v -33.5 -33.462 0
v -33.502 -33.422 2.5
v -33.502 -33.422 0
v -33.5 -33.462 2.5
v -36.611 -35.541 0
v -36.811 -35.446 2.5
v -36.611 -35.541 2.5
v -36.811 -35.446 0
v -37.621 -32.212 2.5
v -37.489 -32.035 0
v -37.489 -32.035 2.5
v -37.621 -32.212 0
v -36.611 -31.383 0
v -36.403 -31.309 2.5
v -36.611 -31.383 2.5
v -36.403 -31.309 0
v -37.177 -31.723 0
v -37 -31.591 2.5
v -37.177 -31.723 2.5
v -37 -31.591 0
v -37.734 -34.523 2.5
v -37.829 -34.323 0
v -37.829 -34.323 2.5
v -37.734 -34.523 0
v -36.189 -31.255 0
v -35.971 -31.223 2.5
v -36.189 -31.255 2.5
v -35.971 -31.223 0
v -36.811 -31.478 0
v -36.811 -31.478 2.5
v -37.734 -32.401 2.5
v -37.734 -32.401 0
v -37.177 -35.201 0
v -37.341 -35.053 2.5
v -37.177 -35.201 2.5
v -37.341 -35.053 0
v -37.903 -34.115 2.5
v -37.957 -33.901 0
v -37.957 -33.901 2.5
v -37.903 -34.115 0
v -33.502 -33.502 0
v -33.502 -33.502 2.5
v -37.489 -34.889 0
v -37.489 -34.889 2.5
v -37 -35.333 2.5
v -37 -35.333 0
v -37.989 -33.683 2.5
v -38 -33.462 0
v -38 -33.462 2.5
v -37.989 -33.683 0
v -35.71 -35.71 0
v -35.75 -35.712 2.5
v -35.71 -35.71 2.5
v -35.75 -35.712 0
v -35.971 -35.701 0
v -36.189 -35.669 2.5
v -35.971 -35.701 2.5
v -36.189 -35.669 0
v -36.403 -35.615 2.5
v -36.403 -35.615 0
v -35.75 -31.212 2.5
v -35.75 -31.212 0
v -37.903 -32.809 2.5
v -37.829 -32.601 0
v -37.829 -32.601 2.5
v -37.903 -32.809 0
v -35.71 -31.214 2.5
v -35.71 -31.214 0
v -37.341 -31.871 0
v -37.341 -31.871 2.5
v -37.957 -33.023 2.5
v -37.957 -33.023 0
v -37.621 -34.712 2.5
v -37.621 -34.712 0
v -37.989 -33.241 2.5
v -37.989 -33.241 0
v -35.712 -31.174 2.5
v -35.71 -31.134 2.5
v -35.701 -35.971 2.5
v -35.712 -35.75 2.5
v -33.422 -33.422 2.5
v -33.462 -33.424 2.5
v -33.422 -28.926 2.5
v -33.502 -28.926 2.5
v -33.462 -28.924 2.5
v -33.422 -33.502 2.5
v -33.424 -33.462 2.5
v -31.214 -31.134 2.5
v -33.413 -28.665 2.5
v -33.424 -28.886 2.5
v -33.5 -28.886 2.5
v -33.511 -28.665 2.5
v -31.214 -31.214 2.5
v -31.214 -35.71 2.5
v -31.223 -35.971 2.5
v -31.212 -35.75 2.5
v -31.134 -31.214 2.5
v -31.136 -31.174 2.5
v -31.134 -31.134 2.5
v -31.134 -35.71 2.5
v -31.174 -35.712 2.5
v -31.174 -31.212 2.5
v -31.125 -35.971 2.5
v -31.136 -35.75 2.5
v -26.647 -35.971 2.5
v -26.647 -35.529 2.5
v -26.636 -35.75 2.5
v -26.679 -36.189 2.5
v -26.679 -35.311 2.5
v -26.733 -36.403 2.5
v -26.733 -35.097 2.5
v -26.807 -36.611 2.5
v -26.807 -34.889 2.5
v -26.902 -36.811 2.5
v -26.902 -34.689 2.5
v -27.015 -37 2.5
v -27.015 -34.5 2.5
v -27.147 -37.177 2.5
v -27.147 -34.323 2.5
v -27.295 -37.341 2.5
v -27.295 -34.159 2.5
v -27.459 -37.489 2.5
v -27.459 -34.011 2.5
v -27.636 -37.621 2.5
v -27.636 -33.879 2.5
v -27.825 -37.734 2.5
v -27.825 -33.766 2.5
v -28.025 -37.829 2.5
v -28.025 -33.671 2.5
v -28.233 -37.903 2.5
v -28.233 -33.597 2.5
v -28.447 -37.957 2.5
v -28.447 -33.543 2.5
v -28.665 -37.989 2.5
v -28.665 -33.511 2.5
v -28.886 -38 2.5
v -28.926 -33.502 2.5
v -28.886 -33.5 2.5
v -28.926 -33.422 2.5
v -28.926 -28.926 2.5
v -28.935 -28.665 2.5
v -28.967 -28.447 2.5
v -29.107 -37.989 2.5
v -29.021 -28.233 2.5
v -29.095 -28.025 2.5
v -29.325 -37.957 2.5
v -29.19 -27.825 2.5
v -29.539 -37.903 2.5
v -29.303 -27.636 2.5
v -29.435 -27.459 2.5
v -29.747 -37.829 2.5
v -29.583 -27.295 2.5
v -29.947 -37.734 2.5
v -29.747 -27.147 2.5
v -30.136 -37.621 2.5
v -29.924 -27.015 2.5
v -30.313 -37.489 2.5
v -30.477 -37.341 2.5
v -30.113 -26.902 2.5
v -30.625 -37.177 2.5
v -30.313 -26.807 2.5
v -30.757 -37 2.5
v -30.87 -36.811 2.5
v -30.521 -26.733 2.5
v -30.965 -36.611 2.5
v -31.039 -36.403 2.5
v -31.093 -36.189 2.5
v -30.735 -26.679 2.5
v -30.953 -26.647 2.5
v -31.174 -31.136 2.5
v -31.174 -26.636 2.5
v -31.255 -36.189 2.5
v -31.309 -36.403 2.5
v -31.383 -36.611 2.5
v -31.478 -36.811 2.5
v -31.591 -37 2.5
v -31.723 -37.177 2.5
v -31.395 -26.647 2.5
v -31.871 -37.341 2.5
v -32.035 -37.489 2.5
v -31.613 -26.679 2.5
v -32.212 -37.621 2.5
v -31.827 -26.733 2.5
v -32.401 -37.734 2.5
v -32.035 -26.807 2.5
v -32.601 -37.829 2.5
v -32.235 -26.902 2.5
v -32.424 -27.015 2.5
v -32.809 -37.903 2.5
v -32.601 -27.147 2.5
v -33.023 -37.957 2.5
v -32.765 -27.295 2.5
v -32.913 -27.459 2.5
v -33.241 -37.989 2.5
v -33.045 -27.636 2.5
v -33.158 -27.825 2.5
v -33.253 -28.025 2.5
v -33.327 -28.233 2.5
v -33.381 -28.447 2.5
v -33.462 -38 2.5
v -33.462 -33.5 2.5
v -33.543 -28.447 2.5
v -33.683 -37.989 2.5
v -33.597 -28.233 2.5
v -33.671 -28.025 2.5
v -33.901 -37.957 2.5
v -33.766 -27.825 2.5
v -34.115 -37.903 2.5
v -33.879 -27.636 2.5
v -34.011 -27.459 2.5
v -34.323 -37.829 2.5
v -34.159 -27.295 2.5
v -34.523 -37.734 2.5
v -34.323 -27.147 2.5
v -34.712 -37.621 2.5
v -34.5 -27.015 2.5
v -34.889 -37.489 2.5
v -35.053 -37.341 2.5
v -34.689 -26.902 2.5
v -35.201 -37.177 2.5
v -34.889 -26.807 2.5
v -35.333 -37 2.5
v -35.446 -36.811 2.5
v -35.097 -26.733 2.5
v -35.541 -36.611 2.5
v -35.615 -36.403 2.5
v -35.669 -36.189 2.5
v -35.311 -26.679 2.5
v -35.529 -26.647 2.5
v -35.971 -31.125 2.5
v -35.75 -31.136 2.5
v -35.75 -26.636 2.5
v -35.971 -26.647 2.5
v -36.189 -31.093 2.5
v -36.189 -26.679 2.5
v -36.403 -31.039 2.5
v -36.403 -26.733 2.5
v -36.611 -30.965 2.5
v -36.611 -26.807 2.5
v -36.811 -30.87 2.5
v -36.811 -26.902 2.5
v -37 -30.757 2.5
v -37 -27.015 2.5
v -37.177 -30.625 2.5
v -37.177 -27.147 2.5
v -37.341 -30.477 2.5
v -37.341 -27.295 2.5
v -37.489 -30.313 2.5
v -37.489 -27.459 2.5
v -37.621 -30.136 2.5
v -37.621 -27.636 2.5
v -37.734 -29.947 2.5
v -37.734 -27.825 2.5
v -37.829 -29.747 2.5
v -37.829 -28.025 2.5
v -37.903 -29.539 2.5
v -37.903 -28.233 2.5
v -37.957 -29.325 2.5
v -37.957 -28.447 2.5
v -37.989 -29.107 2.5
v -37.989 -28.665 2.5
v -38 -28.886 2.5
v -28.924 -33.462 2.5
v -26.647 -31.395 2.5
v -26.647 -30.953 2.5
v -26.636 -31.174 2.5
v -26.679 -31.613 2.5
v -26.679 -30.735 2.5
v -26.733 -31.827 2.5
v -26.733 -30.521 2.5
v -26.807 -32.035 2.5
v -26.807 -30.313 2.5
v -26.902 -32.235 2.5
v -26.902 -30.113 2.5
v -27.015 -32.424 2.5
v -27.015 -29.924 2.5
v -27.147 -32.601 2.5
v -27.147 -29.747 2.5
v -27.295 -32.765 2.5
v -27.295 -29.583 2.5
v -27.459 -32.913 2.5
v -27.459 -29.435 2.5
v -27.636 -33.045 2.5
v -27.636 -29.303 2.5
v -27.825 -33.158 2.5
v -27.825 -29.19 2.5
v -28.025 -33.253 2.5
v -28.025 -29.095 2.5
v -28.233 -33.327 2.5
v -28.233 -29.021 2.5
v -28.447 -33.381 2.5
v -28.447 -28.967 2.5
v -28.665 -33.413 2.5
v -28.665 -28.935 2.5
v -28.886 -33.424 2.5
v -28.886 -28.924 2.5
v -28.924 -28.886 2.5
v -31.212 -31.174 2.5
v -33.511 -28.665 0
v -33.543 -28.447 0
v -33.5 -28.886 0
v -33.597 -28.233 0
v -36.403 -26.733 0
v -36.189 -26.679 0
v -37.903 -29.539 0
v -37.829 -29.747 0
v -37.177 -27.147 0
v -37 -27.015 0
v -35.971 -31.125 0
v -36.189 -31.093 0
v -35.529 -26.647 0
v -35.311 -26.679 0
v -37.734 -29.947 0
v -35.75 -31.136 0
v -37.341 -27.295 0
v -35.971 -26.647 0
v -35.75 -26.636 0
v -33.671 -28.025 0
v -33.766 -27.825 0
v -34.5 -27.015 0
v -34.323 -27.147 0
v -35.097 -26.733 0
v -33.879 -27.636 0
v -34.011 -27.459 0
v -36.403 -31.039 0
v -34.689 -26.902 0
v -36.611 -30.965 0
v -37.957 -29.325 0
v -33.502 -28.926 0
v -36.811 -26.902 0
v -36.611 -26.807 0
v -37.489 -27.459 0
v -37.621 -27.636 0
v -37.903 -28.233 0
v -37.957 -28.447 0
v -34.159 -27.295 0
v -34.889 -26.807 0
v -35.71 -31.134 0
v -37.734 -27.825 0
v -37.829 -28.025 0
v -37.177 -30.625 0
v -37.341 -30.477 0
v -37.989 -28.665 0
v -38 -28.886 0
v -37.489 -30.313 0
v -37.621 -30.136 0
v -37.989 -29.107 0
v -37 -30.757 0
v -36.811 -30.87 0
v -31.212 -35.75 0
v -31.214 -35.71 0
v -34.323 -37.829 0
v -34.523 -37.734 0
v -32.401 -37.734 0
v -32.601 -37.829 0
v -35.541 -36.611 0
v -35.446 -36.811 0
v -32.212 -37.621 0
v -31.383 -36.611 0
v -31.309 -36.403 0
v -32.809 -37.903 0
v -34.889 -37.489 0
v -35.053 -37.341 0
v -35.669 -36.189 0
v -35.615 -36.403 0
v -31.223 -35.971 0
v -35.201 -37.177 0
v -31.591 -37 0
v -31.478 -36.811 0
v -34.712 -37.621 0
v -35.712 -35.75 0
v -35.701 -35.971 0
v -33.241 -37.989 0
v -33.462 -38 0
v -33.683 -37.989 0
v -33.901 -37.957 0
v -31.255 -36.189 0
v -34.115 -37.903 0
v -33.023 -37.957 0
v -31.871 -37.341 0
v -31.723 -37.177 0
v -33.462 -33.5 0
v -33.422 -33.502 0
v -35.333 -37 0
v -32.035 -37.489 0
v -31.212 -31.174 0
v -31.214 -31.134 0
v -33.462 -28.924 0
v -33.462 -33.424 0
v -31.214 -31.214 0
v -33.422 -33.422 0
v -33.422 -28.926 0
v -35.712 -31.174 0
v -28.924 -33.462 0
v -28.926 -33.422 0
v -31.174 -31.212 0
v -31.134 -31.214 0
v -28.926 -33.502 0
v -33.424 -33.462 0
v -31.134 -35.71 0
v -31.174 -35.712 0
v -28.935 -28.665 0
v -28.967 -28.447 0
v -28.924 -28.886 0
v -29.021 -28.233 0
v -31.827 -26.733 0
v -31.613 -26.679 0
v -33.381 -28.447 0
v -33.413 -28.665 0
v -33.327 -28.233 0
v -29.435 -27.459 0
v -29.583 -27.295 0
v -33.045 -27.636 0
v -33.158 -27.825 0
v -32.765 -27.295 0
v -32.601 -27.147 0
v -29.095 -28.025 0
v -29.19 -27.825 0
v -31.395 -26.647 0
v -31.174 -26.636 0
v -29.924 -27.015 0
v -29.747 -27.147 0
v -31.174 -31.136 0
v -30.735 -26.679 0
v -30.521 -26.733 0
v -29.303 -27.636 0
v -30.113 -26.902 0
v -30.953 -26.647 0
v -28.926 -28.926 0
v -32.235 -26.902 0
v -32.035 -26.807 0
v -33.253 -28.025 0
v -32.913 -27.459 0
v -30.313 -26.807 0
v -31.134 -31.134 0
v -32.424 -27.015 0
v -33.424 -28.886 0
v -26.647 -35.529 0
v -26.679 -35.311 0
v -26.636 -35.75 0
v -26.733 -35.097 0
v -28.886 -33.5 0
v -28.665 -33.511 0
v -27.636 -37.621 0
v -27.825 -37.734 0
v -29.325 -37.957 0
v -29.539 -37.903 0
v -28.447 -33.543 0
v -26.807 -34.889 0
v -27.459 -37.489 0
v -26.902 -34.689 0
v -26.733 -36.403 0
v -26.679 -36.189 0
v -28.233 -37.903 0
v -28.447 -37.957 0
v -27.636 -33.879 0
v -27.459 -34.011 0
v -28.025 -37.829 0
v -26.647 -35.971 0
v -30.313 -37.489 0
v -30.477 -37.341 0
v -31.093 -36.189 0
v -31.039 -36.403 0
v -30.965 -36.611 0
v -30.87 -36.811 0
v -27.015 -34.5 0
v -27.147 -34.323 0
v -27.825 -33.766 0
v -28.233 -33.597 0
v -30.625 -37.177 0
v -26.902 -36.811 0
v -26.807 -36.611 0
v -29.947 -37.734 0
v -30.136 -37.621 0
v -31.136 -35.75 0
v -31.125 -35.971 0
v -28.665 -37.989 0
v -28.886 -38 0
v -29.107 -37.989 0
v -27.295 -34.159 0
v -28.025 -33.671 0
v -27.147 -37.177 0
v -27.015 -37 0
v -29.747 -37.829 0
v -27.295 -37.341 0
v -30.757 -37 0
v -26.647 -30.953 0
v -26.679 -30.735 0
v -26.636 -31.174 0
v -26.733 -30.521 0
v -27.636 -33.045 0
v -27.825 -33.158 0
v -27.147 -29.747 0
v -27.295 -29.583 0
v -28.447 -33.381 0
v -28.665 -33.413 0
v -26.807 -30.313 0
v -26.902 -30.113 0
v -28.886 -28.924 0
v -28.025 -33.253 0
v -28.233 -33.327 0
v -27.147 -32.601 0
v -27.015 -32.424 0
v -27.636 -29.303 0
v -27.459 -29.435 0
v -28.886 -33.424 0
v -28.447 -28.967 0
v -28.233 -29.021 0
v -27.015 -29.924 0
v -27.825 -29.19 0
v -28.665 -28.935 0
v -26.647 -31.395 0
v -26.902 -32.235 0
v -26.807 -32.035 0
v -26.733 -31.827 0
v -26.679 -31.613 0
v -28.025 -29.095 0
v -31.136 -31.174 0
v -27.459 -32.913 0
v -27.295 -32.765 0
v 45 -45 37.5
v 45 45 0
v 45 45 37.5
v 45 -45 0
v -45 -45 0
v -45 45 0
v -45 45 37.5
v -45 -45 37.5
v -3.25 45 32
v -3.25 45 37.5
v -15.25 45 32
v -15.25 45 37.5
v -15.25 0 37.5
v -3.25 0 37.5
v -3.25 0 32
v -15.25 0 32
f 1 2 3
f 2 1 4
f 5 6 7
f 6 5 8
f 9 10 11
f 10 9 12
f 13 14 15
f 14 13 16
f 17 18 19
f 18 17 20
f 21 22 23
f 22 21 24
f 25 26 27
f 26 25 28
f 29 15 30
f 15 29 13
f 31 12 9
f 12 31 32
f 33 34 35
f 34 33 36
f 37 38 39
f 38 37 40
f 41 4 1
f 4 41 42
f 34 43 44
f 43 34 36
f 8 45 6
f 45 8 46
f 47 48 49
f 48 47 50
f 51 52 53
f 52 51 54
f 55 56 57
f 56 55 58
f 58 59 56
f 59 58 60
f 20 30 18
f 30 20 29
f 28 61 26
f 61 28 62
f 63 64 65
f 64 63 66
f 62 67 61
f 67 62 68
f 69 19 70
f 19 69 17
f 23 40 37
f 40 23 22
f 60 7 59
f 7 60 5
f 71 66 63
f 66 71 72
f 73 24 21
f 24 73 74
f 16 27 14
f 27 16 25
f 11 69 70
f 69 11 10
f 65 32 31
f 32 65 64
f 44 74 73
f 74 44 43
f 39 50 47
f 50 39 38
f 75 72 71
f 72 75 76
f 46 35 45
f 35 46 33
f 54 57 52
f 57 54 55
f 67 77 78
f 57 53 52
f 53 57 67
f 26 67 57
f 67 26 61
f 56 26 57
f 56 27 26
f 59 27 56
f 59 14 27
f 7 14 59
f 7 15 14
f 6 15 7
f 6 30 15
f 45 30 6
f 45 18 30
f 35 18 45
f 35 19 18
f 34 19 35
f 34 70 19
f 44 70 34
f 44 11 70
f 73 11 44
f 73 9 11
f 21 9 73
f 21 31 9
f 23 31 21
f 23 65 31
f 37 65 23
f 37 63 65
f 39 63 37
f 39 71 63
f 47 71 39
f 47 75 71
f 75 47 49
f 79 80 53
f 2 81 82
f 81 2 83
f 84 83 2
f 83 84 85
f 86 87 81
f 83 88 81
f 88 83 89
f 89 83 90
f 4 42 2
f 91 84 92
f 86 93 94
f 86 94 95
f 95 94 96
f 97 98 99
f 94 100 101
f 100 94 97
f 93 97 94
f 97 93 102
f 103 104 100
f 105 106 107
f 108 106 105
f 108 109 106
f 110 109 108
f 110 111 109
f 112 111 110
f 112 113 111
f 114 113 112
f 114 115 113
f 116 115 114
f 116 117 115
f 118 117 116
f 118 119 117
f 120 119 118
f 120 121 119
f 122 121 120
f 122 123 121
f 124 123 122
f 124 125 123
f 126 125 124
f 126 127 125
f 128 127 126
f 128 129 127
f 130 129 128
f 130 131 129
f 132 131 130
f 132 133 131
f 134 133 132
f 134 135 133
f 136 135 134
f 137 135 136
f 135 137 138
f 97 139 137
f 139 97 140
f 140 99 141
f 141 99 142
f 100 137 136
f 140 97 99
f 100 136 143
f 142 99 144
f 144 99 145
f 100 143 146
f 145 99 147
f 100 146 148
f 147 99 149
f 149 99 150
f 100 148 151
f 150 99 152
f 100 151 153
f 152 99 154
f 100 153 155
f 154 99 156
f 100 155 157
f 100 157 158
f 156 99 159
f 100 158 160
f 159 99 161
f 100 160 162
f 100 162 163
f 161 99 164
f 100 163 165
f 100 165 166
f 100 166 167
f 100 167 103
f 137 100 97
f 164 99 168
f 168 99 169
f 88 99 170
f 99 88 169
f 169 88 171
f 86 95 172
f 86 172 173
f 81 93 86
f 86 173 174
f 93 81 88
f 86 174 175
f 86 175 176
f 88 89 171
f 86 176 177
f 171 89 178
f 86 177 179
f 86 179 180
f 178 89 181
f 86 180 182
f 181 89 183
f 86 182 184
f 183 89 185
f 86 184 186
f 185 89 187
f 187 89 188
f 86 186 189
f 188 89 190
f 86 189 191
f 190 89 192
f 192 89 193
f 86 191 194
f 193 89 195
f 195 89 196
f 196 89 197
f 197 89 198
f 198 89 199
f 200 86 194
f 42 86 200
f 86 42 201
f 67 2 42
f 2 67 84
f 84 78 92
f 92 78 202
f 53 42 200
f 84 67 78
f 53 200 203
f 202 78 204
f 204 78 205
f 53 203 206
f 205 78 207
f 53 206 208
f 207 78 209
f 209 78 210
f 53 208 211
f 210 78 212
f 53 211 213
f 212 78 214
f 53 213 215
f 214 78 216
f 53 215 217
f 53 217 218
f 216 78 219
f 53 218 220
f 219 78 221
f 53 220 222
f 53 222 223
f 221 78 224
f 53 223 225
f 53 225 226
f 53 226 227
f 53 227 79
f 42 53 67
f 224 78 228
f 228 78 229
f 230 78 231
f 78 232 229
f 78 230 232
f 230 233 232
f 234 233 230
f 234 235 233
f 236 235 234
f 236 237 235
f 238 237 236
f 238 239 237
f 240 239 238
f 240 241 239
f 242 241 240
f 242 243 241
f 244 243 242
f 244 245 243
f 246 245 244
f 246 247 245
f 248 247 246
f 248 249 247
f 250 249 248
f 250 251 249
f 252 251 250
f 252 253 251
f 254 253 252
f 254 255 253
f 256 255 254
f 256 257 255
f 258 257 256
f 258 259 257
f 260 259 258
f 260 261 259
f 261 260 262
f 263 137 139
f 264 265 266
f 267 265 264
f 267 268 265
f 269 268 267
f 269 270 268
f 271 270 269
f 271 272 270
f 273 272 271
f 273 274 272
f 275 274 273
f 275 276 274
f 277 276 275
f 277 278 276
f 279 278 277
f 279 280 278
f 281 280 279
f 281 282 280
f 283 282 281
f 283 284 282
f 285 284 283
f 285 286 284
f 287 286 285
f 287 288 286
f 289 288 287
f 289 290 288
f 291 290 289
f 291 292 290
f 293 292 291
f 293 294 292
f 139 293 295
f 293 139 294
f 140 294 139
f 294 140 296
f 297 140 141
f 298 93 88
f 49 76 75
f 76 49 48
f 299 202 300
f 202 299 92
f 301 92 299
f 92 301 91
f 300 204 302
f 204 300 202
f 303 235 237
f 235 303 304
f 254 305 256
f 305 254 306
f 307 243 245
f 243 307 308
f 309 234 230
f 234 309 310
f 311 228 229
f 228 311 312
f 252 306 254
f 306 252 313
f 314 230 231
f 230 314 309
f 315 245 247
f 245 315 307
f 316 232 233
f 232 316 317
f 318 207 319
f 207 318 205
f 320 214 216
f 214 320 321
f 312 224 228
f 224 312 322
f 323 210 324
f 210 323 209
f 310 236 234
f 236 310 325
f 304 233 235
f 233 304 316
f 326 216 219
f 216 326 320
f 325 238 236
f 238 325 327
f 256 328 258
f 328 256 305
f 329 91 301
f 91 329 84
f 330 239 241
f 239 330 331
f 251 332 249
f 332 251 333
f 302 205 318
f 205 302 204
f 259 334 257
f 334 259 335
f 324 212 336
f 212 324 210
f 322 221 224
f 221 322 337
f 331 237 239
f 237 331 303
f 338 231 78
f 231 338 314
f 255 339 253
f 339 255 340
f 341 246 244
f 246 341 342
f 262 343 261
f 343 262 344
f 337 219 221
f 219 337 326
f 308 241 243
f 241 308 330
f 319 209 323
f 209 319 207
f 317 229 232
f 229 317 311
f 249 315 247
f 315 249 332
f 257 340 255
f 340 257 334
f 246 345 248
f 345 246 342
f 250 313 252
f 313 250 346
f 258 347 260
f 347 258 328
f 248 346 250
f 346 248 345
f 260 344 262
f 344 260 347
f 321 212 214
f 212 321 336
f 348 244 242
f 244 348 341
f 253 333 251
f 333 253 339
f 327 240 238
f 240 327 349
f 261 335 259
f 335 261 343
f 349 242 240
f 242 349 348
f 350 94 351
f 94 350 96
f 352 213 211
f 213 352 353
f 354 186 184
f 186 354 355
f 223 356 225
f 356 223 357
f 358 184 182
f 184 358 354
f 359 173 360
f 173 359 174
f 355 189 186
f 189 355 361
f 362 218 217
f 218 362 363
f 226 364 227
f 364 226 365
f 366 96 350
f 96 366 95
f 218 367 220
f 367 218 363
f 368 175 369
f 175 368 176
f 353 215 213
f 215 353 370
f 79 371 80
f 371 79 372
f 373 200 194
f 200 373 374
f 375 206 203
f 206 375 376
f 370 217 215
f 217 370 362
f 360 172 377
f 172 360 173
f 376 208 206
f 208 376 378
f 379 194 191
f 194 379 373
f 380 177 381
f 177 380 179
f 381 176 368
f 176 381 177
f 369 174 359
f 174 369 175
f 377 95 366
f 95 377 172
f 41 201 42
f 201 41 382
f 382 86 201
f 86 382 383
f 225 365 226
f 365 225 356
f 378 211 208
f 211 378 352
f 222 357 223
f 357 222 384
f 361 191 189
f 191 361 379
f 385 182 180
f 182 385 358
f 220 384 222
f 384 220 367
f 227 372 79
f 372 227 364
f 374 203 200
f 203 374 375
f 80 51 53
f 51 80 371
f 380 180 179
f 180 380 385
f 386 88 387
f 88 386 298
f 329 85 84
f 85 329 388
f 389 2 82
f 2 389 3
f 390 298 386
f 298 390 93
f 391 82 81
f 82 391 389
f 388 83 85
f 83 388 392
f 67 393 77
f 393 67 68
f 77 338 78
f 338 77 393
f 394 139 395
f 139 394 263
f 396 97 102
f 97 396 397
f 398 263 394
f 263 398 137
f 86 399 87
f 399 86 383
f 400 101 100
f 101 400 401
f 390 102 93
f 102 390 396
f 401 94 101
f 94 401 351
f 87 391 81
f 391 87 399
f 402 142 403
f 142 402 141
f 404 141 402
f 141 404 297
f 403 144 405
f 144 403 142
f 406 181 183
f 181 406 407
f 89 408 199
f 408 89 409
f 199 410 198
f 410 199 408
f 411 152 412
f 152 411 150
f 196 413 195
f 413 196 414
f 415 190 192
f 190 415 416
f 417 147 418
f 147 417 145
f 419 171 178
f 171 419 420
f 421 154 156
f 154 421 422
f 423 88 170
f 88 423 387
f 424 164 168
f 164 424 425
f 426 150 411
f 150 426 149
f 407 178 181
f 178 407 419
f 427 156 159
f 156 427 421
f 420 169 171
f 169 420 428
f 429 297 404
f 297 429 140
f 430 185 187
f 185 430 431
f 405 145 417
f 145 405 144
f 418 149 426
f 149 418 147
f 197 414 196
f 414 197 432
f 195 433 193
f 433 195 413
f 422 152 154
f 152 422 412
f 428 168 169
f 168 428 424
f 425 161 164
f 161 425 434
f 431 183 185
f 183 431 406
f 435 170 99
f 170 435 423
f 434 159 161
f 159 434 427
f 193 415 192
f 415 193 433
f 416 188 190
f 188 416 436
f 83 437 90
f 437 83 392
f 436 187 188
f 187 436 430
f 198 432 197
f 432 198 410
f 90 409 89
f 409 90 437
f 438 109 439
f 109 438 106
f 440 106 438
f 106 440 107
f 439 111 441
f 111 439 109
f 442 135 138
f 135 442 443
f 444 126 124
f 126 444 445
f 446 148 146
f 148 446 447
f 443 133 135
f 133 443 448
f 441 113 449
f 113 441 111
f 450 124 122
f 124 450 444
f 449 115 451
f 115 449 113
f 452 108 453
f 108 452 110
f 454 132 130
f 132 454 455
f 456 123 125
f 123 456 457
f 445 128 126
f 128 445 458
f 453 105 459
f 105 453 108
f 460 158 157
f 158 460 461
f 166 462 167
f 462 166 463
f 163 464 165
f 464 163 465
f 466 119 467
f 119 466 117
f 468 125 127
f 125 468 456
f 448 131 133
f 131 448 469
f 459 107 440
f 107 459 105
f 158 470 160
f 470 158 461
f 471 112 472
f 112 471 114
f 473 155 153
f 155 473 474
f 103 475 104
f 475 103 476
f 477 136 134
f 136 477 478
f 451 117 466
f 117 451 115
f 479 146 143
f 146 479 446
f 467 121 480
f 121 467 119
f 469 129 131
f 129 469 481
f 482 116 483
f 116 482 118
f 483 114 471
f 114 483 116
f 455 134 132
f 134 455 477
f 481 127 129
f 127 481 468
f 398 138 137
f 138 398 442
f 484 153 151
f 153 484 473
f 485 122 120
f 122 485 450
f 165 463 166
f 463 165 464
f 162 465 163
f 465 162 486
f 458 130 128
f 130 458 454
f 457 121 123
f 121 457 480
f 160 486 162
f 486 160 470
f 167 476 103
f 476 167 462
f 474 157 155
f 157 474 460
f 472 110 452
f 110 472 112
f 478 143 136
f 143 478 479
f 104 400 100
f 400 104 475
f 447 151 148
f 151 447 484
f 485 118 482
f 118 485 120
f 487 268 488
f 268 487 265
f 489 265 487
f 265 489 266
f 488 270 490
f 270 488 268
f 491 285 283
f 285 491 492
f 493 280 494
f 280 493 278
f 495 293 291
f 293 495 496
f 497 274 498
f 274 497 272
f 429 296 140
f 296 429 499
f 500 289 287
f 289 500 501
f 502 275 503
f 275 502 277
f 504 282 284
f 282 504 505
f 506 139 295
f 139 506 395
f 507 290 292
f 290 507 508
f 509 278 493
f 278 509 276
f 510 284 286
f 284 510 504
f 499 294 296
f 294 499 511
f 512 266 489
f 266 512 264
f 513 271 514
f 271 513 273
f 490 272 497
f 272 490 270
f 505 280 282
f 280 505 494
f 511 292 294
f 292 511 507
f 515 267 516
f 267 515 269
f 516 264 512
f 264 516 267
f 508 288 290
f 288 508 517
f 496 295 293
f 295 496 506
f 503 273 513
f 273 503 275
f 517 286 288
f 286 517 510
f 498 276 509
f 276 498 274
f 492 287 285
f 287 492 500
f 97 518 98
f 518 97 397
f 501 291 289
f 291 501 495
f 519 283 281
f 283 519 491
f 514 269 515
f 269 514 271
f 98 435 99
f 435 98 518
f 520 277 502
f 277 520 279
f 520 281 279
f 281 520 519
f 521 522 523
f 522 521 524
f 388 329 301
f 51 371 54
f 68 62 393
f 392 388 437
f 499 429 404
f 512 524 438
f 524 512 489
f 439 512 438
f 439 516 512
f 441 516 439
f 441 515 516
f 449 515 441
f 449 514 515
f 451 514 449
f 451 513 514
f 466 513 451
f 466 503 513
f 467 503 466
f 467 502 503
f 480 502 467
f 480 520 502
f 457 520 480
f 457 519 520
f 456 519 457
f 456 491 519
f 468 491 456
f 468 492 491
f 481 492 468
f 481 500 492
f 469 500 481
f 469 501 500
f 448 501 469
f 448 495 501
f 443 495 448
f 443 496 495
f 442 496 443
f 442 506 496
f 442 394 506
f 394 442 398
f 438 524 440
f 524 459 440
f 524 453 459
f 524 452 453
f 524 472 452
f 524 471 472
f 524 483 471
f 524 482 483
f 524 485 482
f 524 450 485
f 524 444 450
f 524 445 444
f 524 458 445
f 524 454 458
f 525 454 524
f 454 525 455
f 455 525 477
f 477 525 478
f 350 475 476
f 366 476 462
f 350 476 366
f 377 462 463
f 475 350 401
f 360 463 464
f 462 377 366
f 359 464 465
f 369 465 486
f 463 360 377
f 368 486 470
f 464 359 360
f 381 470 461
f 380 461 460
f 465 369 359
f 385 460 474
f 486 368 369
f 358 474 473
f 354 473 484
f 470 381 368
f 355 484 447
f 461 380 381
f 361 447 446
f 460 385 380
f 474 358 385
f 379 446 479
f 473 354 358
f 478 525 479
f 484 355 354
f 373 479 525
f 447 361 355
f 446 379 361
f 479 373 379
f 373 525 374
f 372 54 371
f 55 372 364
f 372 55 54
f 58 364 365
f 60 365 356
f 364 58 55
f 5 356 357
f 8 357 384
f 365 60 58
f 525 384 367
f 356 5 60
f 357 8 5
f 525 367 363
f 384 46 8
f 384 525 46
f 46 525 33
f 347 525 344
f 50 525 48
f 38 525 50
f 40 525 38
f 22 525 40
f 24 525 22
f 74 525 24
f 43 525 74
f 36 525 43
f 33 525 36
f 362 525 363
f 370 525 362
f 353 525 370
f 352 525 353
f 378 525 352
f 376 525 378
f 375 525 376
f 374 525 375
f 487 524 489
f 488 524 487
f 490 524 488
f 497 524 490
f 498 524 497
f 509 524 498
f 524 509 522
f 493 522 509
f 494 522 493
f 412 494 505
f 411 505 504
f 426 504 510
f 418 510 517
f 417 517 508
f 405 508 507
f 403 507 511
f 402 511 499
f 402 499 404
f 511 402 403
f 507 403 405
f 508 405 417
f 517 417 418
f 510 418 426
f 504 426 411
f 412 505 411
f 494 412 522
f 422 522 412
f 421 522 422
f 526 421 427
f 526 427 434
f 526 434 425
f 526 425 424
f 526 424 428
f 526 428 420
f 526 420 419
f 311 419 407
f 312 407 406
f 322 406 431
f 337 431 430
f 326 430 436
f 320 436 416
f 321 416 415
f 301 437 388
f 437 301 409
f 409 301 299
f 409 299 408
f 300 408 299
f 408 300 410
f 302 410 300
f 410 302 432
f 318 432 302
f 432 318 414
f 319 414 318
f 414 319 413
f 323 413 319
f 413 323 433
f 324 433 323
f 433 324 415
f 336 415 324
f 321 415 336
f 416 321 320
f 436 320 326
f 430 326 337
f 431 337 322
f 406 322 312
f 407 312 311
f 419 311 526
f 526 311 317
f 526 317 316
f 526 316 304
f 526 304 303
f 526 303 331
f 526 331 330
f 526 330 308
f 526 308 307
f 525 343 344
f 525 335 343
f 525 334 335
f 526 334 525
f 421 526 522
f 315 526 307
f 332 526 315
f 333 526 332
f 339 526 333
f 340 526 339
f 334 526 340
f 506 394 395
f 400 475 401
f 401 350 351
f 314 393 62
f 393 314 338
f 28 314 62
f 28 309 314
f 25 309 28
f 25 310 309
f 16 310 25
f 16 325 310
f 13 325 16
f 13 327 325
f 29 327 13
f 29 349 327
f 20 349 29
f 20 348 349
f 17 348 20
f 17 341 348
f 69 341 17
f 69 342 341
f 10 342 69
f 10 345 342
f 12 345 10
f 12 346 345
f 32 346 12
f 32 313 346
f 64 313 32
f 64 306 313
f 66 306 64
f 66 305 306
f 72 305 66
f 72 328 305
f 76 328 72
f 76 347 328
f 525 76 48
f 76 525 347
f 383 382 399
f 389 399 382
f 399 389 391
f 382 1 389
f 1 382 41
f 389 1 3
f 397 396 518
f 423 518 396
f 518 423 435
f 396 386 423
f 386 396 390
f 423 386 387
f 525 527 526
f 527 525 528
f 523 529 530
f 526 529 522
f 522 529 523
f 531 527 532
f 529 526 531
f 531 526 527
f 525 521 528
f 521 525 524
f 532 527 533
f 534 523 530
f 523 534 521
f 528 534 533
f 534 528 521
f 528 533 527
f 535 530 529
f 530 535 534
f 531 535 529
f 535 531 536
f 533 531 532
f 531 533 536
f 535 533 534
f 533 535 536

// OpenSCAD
// Magnetic stirrer housing - upside-down open box over PC fan
// Print orientation: top plate on bed (z = 0), walls rise to z = 40

// ---- Dimensions (mm) ----
plate_t      = 2;     // top plate thickness
wall_t       = 2.5;   // wall thickness
box_h        = 40;    // total height of box (open top)
outer_x      = 90;    // outer size in X
outer_y      = 90;    // outer size in Y
hole_d       = 4.5;   // M4 screw hole diameter
hole_p       = 71.5;  // square pitch of hole centres
notch_w      = 12;    // cable notch width
notch_d      = 8;     // cable notch depth from open edge

eps          = 0.5;   // cutter overshoot past faces

$fn = 64;

// ---- Model ----
difference() {
    // Outer block
    translate([-outer_x/2, -outer_y/2, 0])
        cube([outer_x, outer_y, box_h]);

    // Open top: cut down to z = box_h - wall_t
    translate([-outer_x/2, -outer_y/2, box_h - wall_t])
        cube([outer_x, outer_y, wall_t + eps]);

    // Screw holes through top plate
    for (i = [0 : 3])
        for (j = [0 : 3])
            if ((i + j) % 2 == 1)
                translate([(i - (hole_p/2 - hole_d)/2) / (hole_p/2 - hole_d) * hole_p,
                           (j - (hole_p/2 - hole_d)/2) / (hole_p/2 - hole_d) * hole_p,
                           -eps])
                    cylinder(d = hole_d, h = plate_t + 2*eps);

    // Cable notch in one wall (from z = 32 to z = 40)
    translate([-outer_x/2 + (hole_p - notch_w)/2, 0, box_h - notch_d])
        cube([notch_w, outer_y, notch_d + eps]);
}
